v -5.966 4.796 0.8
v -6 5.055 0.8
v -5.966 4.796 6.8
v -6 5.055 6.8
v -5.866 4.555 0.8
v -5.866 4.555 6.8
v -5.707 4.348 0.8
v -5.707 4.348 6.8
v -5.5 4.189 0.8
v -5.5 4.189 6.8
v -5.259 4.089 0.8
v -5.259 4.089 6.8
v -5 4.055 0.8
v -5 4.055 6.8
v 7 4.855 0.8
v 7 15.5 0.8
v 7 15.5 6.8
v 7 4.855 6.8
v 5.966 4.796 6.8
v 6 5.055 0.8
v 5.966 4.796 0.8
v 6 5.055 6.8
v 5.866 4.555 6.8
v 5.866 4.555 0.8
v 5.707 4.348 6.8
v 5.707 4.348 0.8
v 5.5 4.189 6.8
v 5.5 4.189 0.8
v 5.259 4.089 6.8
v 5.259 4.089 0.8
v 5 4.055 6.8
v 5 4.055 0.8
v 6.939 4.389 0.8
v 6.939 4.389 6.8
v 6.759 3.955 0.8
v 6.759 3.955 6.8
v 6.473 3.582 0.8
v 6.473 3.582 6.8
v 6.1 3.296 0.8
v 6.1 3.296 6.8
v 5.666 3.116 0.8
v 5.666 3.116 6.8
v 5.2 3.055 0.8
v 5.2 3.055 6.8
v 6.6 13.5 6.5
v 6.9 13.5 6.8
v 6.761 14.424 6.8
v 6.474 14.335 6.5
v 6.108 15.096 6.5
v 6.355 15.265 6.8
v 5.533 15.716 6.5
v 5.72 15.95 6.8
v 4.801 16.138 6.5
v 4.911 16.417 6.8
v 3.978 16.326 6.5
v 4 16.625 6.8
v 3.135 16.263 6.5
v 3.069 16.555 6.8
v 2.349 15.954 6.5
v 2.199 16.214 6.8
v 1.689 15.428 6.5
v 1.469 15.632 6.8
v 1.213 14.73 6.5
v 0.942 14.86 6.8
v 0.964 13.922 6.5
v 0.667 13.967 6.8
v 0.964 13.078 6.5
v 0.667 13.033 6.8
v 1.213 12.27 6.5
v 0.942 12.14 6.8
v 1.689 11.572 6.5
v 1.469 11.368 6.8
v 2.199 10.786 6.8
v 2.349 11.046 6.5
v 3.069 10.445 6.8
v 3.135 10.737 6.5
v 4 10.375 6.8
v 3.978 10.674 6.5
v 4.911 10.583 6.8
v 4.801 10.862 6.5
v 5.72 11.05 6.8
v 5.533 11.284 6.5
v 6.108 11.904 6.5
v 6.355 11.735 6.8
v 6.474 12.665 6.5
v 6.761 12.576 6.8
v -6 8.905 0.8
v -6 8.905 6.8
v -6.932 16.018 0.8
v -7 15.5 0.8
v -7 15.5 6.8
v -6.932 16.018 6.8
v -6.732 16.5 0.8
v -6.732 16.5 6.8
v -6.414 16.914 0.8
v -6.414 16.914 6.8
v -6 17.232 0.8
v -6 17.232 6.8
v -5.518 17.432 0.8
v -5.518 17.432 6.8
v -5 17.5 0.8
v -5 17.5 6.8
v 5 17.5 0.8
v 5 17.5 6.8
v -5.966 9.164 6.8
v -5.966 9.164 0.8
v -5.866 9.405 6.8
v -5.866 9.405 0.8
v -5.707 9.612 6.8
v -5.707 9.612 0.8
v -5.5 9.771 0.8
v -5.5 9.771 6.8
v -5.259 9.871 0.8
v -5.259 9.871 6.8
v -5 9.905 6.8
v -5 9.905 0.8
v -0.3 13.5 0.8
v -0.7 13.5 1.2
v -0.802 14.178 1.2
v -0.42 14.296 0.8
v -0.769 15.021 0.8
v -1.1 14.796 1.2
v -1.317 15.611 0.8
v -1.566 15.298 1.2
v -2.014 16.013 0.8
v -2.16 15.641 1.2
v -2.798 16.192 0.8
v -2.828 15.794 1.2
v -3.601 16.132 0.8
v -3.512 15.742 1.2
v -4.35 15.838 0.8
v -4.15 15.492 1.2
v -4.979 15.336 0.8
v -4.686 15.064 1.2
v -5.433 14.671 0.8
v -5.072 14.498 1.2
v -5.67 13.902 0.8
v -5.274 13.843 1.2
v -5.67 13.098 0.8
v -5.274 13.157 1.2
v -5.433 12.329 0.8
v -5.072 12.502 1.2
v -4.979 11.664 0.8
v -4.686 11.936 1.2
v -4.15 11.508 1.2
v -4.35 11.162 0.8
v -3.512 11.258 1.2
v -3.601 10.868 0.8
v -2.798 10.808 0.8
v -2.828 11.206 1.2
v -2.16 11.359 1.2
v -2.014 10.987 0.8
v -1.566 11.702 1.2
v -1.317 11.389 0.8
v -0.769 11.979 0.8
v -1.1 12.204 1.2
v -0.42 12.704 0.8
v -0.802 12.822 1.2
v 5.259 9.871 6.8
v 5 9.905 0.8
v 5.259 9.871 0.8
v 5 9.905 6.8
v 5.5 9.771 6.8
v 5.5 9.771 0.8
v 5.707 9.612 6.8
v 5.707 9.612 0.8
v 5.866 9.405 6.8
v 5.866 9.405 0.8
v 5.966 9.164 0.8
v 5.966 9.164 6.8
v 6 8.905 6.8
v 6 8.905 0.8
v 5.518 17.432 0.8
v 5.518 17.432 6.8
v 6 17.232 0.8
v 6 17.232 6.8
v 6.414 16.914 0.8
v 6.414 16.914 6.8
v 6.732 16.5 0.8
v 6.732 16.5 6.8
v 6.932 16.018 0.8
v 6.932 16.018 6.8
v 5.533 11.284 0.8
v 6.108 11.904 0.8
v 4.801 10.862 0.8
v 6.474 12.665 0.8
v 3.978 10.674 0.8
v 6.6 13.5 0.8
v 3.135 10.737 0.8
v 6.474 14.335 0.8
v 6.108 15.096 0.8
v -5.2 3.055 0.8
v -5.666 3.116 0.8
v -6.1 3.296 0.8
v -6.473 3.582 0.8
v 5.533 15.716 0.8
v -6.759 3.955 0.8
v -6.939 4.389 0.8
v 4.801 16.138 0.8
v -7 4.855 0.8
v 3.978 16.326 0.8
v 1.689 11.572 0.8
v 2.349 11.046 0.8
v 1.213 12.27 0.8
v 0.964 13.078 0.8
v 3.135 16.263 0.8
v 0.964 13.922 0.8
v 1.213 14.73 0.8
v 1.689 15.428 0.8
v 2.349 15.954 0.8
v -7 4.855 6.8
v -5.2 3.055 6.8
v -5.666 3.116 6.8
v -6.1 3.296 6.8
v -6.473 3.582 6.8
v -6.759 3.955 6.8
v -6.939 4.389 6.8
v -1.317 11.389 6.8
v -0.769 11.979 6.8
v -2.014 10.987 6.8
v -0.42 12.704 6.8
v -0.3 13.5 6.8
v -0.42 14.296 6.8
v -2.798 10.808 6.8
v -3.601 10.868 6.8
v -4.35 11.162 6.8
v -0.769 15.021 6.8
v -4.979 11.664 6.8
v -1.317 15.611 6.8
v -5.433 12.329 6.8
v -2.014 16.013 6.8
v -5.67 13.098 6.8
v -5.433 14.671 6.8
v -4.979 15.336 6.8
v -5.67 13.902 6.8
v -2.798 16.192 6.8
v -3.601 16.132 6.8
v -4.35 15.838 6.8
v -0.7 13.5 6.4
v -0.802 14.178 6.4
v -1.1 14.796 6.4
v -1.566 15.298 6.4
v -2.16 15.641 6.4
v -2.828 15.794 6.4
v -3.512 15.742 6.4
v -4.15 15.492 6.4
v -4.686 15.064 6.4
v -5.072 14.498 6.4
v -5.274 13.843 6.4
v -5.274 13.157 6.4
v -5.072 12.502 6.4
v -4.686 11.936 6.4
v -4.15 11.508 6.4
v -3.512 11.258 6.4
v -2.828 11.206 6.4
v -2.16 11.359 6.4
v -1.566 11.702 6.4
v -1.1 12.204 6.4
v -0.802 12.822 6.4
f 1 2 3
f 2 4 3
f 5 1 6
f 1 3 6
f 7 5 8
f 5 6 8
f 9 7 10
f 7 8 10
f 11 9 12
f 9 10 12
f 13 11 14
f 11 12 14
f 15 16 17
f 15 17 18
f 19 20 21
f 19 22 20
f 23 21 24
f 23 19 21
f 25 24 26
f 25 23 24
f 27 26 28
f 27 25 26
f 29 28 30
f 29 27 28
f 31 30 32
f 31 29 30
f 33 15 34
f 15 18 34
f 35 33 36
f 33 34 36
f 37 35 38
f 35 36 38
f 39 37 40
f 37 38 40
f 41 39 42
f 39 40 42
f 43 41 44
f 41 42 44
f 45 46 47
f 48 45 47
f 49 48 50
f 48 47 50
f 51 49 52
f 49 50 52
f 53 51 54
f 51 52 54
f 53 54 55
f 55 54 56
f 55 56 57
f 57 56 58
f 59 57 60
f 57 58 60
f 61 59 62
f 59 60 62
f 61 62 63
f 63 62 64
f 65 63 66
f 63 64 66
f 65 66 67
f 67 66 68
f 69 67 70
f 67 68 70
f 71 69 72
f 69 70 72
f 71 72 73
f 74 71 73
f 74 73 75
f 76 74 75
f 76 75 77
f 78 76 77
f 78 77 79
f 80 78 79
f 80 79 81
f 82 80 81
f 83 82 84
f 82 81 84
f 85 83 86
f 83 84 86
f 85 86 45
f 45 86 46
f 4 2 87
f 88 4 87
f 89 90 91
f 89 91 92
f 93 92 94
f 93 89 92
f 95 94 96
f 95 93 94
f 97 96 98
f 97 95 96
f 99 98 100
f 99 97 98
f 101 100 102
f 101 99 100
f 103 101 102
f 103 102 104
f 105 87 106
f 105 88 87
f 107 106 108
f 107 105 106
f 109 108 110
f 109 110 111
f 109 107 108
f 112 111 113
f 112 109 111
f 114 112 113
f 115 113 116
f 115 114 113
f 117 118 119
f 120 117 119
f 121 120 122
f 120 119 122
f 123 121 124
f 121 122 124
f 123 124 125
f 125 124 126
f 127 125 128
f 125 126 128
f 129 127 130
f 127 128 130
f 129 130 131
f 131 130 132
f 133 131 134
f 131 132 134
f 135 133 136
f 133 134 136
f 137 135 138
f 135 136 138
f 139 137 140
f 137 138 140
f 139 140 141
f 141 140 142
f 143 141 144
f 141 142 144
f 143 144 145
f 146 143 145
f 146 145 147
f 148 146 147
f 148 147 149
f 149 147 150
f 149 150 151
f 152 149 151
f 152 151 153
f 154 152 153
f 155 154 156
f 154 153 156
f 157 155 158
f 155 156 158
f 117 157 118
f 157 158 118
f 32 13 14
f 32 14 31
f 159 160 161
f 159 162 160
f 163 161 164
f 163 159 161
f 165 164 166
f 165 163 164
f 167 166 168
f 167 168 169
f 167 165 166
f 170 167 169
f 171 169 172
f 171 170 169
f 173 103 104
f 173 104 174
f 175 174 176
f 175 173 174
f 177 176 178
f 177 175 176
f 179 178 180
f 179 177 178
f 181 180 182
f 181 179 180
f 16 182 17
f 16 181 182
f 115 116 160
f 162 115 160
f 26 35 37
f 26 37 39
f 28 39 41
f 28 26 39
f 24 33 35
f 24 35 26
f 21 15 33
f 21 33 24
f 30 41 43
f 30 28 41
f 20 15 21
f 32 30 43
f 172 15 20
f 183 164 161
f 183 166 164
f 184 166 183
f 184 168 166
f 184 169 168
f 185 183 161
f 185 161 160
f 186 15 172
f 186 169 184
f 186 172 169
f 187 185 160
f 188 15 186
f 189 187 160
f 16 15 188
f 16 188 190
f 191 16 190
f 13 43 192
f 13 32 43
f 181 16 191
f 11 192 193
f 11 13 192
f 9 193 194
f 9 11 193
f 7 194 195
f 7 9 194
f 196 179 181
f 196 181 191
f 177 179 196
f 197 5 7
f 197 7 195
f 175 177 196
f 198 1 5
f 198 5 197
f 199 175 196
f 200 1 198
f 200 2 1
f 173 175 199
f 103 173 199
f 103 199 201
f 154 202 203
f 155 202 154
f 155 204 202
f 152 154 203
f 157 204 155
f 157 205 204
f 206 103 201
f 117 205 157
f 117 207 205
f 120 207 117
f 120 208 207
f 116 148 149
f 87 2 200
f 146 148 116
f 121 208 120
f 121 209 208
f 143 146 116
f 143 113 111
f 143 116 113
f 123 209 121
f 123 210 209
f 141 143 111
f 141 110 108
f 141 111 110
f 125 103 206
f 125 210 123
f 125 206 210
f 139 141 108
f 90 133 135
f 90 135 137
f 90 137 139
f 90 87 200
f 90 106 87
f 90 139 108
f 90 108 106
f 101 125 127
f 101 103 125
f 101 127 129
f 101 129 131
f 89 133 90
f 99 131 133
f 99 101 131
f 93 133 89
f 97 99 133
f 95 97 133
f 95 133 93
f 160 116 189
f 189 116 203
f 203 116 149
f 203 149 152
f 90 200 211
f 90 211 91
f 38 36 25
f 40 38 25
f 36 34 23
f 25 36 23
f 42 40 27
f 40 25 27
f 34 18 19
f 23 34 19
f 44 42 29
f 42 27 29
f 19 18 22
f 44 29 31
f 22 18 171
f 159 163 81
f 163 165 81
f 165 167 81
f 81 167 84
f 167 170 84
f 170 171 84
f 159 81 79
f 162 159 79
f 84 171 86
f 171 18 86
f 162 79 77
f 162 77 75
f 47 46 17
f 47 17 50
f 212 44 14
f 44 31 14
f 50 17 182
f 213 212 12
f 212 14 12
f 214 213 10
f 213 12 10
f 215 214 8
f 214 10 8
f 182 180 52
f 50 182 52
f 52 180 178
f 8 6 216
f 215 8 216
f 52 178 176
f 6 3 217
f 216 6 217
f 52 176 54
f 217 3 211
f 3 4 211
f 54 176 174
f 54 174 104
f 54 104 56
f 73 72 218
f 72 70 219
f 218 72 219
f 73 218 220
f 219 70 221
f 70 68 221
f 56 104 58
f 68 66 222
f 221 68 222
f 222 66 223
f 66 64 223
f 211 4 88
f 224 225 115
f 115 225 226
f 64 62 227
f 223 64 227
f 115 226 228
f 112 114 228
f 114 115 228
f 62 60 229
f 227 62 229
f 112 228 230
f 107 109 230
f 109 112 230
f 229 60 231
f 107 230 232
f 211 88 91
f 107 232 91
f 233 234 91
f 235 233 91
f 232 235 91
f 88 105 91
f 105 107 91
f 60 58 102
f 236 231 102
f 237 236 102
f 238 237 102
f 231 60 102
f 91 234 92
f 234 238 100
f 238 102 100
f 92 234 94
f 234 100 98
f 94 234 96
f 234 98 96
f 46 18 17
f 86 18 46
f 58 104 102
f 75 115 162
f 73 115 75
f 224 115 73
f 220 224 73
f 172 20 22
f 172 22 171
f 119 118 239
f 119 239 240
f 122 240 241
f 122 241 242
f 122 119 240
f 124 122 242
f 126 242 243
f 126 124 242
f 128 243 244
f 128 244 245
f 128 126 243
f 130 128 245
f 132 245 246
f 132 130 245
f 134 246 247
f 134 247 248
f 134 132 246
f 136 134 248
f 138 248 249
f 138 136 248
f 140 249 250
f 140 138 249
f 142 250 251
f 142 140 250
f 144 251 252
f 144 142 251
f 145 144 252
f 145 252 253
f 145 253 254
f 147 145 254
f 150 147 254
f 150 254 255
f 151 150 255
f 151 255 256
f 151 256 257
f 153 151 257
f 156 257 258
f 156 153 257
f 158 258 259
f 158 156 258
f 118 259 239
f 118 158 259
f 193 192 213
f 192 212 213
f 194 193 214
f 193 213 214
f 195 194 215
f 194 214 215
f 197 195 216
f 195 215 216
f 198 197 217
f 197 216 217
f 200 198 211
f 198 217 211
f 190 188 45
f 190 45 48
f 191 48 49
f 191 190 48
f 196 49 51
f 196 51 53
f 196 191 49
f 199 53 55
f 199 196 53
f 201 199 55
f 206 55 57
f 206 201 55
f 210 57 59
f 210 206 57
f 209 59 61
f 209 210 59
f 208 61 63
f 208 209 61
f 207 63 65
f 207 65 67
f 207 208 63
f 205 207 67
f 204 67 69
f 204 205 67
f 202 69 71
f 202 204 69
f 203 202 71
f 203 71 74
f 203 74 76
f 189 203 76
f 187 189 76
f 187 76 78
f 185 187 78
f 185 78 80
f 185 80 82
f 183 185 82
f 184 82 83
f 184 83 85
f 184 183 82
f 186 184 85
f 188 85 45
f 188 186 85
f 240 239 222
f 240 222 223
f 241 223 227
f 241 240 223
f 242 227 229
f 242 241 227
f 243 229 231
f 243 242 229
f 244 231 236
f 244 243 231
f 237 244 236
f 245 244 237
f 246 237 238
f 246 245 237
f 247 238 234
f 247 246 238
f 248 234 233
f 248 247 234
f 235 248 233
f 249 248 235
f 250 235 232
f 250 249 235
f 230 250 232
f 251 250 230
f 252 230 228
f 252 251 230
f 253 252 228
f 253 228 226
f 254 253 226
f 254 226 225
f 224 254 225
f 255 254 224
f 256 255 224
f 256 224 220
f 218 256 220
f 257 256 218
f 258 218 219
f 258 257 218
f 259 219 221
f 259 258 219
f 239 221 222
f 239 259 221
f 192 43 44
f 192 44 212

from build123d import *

# Parameters (mm, degrees)
SKETCH_R        = 2.3
SKETCH_R_2      = 2.834
SKETCH_W        = 12
SKETCH_H        = 5.85
PAD_DEPTH       = 6
FILLET_R        = 1
CHAMFER_SIZE    = 0.4
CHAMFER001_SIZE = 0.3
FILLET001_R     = 1.8


with BuildPart() as part:
    # Sketch (on XY_Plane of Origin) → Pad (new body)
    with BuildSketch(Plane.XY):
        with BuildLine():
            Line((7, 15.5), (7, 3.055))
            Line((7, 3.055), (-7, 3.055))
            Line((-7, 3.055), (-7, 15.5))
            ThreePointArc((-7, 15.5), (-6.414214, 16.914214), (-5, 17.5))
            Line((-5, 17.5), (5, 17.5))
            ThreePointArc((5, 17.5), (6.414214, 16.914214), (7, 15.5))
        make_face()
        with Locations((-3, 13.5)):
            Circle(SKETCH_R, mode=Mode.SUBTRACT)
        with Locations((3.766, 13.5)):
            Circle(SKETCH_R_2, mode=Mode.SUBTRACT)
        with Locations((0, 6.98)):
            Rectangle(SKETCH_W, SKETCH_H, mode=Mode.SUBTRACT)
    extrude(amount=PAD_DEPTH)

    # Fillet
    fillet_edges = [part.edges().sort_by_distance(p)[0] for p in [
        (6, 9.905, 3),
        (6, 4.055, 3),
        (-6, 9.905, 3),
        (-6, 4.055, 3),
    ]]
    fillet(fillet_edges, radius=FILLET_R)

    # Chamfer
    chamfer_edges = [part.edges().sort_by_distance(p)[0] for p in [
        (-5.3, 13.5, 0),
        (-5.3, 13.5, 6),
    ]]
    chamfer(chamfer_edges, length=CHAMFER_SIZE)

    # Chamfer001
    chamfer001_edges = [part.edges().sort_by_distance(p)[0] for p in [
        (0.932, 13.5, 6),
    ]]
    chamfer(chamfer001_edges, length=CHAMFER001_SIZE)

    # Fillet001
    fillet001_edges = [part.edges().sort_by_distance(p)[0] for p in [
        (-7, 3.055, 3),
        (7, 3.055, 3),
    ]]
    fillet(fillet001_edges, radius=FILLET001_R)


with BuildPart() as part_1:
    # Body placement: moved
    add(part.part.moved(Location((0, 0, 0.8))))


solid = part_1.part
